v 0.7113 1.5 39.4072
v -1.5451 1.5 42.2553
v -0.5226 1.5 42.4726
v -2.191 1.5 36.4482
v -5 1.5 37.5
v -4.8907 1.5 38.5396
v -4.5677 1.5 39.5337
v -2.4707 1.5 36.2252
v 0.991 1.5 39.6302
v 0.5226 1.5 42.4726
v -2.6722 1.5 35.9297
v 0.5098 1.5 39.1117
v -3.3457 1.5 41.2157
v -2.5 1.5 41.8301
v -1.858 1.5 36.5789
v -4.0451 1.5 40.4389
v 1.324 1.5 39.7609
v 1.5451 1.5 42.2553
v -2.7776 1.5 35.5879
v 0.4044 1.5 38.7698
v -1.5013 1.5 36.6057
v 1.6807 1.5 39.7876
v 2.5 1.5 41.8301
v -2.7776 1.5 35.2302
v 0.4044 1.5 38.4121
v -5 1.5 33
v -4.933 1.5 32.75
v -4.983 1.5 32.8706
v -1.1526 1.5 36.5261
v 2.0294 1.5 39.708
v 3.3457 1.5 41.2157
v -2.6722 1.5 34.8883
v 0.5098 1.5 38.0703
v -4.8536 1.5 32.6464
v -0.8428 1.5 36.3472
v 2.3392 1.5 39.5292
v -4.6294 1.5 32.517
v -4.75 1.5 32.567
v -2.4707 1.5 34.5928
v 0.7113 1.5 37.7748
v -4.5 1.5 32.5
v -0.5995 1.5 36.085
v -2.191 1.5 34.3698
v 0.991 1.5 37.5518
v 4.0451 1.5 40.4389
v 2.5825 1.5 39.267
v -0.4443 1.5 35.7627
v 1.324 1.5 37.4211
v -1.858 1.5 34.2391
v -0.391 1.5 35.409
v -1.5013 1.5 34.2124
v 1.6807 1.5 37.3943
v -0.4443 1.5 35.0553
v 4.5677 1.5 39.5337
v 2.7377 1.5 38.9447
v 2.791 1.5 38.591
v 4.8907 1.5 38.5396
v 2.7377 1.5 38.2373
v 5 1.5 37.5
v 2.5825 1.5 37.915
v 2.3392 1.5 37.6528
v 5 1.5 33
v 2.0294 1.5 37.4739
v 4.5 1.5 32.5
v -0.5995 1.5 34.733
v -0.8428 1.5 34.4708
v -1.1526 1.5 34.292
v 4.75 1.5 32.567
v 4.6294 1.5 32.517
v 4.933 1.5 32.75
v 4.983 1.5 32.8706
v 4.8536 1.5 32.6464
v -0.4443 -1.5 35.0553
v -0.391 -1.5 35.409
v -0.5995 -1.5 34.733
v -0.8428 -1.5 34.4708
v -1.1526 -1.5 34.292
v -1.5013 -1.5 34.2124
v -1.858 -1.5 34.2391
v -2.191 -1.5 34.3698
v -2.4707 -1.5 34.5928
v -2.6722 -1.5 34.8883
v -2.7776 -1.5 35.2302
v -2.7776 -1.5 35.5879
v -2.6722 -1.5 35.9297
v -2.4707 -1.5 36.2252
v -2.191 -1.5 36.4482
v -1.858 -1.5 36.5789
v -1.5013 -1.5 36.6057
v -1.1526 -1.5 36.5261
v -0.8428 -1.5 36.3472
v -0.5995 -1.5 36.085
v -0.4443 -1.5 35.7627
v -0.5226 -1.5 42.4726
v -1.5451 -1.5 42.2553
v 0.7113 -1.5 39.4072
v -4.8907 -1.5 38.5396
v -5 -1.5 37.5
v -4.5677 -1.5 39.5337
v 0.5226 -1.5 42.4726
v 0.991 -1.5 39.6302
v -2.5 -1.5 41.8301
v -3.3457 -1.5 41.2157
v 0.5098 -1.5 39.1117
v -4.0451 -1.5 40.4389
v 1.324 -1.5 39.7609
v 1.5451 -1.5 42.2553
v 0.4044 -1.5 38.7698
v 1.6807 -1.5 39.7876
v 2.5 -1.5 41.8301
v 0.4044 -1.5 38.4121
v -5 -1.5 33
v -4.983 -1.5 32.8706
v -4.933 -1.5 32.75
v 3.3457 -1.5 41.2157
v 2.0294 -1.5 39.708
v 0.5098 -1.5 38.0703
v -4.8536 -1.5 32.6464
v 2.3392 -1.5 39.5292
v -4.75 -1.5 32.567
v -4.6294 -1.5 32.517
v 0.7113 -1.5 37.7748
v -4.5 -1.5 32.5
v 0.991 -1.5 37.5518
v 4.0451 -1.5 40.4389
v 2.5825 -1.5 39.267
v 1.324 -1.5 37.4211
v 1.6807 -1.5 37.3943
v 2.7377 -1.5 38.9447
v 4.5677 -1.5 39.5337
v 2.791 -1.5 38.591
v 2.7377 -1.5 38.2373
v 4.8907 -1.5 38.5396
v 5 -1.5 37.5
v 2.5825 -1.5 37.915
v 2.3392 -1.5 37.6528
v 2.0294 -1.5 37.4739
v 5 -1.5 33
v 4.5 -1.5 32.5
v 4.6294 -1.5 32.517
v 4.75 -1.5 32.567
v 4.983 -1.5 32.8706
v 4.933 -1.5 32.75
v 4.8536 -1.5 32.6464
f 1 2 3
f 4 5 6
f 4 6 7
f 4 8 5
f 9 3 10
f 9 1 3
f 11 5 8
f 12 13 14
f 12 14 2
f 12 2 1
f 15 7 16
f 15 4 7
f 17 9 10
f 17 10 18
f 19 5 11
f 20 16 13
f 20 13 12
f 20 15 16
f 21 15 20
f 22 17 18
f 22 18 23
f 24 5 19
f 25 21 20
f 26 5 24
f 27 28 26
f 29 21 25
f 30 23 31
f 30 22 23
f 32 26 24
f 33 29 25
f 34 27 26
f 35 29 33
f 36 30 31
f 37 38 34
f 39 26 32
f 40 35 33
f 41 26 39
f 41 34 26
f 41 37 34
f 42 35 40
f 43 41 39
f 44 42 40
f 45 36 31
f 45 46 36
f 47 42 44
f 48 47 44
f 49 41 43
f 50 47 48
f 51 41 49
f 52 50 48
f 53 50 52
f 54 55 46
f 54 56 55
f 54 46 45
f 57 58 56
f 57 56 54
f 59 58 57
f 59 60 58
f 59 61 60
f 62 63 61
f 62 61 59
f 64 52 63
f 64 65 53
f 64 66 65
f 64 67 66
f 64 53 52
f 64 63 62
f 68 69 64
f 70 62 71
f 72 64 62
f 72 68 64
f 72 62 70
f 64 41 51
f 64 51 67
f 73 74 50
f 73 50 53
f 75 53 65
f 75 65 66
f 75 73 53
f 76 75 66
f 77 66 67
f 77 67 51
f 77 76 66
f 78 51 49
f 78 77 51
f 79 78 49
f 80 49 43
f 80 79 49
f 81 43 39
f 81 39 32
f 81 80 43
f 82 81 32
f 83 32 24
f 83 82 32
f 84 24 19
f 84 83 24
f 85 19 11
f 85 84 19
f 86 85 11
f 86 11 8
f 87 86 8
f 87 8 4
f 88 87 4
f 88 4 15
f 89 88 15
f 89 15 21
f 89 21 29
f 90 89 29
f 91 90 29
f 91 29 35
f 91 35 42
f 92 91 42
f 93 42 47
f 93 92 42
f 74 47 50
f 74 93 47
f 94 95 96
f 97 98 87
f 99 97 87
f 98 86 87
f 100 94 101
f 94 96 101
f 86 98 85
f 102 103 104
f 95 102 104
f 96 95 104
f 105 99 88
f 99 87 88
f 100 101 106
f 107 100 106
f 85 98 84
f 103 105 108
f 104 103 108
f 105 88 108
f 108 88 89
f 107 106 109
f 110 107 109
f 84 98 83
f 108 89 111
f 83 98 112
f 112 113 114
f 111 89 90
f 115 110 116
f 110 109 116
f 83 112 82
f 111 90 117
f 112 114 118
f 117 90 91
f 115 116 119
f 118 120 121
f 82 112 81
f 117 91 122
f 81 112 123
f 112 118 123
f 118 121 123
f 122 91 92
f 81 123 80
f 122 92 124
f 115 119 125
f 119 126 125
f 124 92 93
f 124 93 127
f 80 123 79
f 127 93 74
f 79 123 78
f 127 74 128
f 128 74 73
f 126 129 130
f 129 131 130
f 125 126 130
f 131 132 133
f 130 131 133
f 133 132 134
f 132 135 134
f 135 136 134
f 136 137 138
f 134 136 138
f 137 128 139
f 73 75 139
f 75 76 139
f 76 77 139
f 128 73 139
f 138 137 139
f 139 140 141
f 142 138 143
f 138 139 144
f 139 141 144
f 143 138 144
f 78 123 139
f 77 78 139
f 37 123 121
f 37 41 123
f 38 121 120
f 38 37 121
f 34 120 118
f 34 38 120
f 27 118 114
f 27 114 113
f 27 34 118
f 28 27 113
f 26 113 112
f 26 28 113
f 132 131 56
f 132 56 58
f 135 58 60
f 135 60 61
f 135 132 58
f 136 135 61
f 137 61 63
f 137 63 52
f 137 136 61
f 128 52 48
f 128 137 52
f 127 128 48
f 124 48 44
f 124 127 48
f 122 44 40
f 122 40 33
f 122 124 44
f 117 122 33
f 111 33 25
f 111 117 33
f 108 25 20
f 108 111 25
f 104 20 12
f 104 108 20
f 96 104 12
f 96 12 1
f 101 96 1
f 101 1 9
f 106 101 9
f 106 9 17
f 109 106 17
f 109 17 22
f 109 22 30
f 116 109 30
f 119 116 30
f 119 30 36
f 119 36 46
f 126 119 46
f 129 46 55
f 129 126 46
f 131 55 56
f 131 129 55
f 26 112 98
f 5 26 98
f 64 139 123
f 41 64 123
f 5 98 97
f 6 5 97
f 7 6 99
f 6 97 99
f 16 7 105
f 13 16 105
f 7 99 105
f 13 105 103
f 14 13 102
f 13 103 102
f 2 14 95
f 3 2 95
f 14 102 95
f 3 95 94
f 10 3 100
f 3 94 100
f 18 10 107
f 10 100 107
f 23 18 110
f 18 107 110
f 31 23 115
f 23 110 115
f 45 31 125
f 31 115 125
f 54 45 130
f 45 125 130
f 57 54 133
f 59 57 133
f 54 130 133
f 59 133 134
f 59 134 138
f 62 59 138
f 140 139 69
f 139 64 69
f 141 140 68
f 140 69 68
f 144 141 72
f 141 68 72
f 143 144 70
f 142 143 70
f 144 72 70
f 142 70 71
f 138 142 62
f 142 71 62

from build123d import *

# Parameters (mm, degrees)
STOCK_U_HANDLE_1_START     = -1.5
STOCK_U_HANDLE_1_OUTLINE_R = 1.2
STOCK_U_HANDLE_1_DEPTH     = 3
FILLET1_R                  = 0.5


# Read off the part's stored shape, not the designer's step: Stock-u-handle-1
with BuildPart() as part:
    # Stock-u-handle-1 outline → Stock-u-handle-1 (new body)
    with BuildSketch(Plane(origin=(0, 0, 0), x_dir=(1, 0, 0), z_dir=(0, 1, 0)).offset(STOCK_U_HANDLE_1_START)):
        with BuildLine():
            Line((5, -32.5), (-5, -32.5))
            Line((-5, -32.5), (-5, -37.5))
            ThreePointArc((-5, -37.5), (0, -42.5), (5, -37.5))
            Line((5, -37.5), (5, -32.5))
        make_face()
        with Locations((1.590990258, -38.590990258)):
            Circle(STOCK_U_HANDLE_1_OUTLINE_R, mode=Mode.SUBTRACT)
        with Locations((-1.590990258, -35.409009742)):
            Circle(STOCK_U_HANDLE_1_OUTLINE_R, mode=Mode.SUBTRACT)
    extrude(amount=STOCK_U_HANDLE_1_DEPTH)

    # Fillet1
    fillet1_edges = [part.edges().sort_by_distance(p)[0] for p in [
        (-5, 0, 32.5),
        (5, 0, 32.5),
    ]]
    fillet(fillet1_edges, radius=FILLET1_R)


solid = part.part
